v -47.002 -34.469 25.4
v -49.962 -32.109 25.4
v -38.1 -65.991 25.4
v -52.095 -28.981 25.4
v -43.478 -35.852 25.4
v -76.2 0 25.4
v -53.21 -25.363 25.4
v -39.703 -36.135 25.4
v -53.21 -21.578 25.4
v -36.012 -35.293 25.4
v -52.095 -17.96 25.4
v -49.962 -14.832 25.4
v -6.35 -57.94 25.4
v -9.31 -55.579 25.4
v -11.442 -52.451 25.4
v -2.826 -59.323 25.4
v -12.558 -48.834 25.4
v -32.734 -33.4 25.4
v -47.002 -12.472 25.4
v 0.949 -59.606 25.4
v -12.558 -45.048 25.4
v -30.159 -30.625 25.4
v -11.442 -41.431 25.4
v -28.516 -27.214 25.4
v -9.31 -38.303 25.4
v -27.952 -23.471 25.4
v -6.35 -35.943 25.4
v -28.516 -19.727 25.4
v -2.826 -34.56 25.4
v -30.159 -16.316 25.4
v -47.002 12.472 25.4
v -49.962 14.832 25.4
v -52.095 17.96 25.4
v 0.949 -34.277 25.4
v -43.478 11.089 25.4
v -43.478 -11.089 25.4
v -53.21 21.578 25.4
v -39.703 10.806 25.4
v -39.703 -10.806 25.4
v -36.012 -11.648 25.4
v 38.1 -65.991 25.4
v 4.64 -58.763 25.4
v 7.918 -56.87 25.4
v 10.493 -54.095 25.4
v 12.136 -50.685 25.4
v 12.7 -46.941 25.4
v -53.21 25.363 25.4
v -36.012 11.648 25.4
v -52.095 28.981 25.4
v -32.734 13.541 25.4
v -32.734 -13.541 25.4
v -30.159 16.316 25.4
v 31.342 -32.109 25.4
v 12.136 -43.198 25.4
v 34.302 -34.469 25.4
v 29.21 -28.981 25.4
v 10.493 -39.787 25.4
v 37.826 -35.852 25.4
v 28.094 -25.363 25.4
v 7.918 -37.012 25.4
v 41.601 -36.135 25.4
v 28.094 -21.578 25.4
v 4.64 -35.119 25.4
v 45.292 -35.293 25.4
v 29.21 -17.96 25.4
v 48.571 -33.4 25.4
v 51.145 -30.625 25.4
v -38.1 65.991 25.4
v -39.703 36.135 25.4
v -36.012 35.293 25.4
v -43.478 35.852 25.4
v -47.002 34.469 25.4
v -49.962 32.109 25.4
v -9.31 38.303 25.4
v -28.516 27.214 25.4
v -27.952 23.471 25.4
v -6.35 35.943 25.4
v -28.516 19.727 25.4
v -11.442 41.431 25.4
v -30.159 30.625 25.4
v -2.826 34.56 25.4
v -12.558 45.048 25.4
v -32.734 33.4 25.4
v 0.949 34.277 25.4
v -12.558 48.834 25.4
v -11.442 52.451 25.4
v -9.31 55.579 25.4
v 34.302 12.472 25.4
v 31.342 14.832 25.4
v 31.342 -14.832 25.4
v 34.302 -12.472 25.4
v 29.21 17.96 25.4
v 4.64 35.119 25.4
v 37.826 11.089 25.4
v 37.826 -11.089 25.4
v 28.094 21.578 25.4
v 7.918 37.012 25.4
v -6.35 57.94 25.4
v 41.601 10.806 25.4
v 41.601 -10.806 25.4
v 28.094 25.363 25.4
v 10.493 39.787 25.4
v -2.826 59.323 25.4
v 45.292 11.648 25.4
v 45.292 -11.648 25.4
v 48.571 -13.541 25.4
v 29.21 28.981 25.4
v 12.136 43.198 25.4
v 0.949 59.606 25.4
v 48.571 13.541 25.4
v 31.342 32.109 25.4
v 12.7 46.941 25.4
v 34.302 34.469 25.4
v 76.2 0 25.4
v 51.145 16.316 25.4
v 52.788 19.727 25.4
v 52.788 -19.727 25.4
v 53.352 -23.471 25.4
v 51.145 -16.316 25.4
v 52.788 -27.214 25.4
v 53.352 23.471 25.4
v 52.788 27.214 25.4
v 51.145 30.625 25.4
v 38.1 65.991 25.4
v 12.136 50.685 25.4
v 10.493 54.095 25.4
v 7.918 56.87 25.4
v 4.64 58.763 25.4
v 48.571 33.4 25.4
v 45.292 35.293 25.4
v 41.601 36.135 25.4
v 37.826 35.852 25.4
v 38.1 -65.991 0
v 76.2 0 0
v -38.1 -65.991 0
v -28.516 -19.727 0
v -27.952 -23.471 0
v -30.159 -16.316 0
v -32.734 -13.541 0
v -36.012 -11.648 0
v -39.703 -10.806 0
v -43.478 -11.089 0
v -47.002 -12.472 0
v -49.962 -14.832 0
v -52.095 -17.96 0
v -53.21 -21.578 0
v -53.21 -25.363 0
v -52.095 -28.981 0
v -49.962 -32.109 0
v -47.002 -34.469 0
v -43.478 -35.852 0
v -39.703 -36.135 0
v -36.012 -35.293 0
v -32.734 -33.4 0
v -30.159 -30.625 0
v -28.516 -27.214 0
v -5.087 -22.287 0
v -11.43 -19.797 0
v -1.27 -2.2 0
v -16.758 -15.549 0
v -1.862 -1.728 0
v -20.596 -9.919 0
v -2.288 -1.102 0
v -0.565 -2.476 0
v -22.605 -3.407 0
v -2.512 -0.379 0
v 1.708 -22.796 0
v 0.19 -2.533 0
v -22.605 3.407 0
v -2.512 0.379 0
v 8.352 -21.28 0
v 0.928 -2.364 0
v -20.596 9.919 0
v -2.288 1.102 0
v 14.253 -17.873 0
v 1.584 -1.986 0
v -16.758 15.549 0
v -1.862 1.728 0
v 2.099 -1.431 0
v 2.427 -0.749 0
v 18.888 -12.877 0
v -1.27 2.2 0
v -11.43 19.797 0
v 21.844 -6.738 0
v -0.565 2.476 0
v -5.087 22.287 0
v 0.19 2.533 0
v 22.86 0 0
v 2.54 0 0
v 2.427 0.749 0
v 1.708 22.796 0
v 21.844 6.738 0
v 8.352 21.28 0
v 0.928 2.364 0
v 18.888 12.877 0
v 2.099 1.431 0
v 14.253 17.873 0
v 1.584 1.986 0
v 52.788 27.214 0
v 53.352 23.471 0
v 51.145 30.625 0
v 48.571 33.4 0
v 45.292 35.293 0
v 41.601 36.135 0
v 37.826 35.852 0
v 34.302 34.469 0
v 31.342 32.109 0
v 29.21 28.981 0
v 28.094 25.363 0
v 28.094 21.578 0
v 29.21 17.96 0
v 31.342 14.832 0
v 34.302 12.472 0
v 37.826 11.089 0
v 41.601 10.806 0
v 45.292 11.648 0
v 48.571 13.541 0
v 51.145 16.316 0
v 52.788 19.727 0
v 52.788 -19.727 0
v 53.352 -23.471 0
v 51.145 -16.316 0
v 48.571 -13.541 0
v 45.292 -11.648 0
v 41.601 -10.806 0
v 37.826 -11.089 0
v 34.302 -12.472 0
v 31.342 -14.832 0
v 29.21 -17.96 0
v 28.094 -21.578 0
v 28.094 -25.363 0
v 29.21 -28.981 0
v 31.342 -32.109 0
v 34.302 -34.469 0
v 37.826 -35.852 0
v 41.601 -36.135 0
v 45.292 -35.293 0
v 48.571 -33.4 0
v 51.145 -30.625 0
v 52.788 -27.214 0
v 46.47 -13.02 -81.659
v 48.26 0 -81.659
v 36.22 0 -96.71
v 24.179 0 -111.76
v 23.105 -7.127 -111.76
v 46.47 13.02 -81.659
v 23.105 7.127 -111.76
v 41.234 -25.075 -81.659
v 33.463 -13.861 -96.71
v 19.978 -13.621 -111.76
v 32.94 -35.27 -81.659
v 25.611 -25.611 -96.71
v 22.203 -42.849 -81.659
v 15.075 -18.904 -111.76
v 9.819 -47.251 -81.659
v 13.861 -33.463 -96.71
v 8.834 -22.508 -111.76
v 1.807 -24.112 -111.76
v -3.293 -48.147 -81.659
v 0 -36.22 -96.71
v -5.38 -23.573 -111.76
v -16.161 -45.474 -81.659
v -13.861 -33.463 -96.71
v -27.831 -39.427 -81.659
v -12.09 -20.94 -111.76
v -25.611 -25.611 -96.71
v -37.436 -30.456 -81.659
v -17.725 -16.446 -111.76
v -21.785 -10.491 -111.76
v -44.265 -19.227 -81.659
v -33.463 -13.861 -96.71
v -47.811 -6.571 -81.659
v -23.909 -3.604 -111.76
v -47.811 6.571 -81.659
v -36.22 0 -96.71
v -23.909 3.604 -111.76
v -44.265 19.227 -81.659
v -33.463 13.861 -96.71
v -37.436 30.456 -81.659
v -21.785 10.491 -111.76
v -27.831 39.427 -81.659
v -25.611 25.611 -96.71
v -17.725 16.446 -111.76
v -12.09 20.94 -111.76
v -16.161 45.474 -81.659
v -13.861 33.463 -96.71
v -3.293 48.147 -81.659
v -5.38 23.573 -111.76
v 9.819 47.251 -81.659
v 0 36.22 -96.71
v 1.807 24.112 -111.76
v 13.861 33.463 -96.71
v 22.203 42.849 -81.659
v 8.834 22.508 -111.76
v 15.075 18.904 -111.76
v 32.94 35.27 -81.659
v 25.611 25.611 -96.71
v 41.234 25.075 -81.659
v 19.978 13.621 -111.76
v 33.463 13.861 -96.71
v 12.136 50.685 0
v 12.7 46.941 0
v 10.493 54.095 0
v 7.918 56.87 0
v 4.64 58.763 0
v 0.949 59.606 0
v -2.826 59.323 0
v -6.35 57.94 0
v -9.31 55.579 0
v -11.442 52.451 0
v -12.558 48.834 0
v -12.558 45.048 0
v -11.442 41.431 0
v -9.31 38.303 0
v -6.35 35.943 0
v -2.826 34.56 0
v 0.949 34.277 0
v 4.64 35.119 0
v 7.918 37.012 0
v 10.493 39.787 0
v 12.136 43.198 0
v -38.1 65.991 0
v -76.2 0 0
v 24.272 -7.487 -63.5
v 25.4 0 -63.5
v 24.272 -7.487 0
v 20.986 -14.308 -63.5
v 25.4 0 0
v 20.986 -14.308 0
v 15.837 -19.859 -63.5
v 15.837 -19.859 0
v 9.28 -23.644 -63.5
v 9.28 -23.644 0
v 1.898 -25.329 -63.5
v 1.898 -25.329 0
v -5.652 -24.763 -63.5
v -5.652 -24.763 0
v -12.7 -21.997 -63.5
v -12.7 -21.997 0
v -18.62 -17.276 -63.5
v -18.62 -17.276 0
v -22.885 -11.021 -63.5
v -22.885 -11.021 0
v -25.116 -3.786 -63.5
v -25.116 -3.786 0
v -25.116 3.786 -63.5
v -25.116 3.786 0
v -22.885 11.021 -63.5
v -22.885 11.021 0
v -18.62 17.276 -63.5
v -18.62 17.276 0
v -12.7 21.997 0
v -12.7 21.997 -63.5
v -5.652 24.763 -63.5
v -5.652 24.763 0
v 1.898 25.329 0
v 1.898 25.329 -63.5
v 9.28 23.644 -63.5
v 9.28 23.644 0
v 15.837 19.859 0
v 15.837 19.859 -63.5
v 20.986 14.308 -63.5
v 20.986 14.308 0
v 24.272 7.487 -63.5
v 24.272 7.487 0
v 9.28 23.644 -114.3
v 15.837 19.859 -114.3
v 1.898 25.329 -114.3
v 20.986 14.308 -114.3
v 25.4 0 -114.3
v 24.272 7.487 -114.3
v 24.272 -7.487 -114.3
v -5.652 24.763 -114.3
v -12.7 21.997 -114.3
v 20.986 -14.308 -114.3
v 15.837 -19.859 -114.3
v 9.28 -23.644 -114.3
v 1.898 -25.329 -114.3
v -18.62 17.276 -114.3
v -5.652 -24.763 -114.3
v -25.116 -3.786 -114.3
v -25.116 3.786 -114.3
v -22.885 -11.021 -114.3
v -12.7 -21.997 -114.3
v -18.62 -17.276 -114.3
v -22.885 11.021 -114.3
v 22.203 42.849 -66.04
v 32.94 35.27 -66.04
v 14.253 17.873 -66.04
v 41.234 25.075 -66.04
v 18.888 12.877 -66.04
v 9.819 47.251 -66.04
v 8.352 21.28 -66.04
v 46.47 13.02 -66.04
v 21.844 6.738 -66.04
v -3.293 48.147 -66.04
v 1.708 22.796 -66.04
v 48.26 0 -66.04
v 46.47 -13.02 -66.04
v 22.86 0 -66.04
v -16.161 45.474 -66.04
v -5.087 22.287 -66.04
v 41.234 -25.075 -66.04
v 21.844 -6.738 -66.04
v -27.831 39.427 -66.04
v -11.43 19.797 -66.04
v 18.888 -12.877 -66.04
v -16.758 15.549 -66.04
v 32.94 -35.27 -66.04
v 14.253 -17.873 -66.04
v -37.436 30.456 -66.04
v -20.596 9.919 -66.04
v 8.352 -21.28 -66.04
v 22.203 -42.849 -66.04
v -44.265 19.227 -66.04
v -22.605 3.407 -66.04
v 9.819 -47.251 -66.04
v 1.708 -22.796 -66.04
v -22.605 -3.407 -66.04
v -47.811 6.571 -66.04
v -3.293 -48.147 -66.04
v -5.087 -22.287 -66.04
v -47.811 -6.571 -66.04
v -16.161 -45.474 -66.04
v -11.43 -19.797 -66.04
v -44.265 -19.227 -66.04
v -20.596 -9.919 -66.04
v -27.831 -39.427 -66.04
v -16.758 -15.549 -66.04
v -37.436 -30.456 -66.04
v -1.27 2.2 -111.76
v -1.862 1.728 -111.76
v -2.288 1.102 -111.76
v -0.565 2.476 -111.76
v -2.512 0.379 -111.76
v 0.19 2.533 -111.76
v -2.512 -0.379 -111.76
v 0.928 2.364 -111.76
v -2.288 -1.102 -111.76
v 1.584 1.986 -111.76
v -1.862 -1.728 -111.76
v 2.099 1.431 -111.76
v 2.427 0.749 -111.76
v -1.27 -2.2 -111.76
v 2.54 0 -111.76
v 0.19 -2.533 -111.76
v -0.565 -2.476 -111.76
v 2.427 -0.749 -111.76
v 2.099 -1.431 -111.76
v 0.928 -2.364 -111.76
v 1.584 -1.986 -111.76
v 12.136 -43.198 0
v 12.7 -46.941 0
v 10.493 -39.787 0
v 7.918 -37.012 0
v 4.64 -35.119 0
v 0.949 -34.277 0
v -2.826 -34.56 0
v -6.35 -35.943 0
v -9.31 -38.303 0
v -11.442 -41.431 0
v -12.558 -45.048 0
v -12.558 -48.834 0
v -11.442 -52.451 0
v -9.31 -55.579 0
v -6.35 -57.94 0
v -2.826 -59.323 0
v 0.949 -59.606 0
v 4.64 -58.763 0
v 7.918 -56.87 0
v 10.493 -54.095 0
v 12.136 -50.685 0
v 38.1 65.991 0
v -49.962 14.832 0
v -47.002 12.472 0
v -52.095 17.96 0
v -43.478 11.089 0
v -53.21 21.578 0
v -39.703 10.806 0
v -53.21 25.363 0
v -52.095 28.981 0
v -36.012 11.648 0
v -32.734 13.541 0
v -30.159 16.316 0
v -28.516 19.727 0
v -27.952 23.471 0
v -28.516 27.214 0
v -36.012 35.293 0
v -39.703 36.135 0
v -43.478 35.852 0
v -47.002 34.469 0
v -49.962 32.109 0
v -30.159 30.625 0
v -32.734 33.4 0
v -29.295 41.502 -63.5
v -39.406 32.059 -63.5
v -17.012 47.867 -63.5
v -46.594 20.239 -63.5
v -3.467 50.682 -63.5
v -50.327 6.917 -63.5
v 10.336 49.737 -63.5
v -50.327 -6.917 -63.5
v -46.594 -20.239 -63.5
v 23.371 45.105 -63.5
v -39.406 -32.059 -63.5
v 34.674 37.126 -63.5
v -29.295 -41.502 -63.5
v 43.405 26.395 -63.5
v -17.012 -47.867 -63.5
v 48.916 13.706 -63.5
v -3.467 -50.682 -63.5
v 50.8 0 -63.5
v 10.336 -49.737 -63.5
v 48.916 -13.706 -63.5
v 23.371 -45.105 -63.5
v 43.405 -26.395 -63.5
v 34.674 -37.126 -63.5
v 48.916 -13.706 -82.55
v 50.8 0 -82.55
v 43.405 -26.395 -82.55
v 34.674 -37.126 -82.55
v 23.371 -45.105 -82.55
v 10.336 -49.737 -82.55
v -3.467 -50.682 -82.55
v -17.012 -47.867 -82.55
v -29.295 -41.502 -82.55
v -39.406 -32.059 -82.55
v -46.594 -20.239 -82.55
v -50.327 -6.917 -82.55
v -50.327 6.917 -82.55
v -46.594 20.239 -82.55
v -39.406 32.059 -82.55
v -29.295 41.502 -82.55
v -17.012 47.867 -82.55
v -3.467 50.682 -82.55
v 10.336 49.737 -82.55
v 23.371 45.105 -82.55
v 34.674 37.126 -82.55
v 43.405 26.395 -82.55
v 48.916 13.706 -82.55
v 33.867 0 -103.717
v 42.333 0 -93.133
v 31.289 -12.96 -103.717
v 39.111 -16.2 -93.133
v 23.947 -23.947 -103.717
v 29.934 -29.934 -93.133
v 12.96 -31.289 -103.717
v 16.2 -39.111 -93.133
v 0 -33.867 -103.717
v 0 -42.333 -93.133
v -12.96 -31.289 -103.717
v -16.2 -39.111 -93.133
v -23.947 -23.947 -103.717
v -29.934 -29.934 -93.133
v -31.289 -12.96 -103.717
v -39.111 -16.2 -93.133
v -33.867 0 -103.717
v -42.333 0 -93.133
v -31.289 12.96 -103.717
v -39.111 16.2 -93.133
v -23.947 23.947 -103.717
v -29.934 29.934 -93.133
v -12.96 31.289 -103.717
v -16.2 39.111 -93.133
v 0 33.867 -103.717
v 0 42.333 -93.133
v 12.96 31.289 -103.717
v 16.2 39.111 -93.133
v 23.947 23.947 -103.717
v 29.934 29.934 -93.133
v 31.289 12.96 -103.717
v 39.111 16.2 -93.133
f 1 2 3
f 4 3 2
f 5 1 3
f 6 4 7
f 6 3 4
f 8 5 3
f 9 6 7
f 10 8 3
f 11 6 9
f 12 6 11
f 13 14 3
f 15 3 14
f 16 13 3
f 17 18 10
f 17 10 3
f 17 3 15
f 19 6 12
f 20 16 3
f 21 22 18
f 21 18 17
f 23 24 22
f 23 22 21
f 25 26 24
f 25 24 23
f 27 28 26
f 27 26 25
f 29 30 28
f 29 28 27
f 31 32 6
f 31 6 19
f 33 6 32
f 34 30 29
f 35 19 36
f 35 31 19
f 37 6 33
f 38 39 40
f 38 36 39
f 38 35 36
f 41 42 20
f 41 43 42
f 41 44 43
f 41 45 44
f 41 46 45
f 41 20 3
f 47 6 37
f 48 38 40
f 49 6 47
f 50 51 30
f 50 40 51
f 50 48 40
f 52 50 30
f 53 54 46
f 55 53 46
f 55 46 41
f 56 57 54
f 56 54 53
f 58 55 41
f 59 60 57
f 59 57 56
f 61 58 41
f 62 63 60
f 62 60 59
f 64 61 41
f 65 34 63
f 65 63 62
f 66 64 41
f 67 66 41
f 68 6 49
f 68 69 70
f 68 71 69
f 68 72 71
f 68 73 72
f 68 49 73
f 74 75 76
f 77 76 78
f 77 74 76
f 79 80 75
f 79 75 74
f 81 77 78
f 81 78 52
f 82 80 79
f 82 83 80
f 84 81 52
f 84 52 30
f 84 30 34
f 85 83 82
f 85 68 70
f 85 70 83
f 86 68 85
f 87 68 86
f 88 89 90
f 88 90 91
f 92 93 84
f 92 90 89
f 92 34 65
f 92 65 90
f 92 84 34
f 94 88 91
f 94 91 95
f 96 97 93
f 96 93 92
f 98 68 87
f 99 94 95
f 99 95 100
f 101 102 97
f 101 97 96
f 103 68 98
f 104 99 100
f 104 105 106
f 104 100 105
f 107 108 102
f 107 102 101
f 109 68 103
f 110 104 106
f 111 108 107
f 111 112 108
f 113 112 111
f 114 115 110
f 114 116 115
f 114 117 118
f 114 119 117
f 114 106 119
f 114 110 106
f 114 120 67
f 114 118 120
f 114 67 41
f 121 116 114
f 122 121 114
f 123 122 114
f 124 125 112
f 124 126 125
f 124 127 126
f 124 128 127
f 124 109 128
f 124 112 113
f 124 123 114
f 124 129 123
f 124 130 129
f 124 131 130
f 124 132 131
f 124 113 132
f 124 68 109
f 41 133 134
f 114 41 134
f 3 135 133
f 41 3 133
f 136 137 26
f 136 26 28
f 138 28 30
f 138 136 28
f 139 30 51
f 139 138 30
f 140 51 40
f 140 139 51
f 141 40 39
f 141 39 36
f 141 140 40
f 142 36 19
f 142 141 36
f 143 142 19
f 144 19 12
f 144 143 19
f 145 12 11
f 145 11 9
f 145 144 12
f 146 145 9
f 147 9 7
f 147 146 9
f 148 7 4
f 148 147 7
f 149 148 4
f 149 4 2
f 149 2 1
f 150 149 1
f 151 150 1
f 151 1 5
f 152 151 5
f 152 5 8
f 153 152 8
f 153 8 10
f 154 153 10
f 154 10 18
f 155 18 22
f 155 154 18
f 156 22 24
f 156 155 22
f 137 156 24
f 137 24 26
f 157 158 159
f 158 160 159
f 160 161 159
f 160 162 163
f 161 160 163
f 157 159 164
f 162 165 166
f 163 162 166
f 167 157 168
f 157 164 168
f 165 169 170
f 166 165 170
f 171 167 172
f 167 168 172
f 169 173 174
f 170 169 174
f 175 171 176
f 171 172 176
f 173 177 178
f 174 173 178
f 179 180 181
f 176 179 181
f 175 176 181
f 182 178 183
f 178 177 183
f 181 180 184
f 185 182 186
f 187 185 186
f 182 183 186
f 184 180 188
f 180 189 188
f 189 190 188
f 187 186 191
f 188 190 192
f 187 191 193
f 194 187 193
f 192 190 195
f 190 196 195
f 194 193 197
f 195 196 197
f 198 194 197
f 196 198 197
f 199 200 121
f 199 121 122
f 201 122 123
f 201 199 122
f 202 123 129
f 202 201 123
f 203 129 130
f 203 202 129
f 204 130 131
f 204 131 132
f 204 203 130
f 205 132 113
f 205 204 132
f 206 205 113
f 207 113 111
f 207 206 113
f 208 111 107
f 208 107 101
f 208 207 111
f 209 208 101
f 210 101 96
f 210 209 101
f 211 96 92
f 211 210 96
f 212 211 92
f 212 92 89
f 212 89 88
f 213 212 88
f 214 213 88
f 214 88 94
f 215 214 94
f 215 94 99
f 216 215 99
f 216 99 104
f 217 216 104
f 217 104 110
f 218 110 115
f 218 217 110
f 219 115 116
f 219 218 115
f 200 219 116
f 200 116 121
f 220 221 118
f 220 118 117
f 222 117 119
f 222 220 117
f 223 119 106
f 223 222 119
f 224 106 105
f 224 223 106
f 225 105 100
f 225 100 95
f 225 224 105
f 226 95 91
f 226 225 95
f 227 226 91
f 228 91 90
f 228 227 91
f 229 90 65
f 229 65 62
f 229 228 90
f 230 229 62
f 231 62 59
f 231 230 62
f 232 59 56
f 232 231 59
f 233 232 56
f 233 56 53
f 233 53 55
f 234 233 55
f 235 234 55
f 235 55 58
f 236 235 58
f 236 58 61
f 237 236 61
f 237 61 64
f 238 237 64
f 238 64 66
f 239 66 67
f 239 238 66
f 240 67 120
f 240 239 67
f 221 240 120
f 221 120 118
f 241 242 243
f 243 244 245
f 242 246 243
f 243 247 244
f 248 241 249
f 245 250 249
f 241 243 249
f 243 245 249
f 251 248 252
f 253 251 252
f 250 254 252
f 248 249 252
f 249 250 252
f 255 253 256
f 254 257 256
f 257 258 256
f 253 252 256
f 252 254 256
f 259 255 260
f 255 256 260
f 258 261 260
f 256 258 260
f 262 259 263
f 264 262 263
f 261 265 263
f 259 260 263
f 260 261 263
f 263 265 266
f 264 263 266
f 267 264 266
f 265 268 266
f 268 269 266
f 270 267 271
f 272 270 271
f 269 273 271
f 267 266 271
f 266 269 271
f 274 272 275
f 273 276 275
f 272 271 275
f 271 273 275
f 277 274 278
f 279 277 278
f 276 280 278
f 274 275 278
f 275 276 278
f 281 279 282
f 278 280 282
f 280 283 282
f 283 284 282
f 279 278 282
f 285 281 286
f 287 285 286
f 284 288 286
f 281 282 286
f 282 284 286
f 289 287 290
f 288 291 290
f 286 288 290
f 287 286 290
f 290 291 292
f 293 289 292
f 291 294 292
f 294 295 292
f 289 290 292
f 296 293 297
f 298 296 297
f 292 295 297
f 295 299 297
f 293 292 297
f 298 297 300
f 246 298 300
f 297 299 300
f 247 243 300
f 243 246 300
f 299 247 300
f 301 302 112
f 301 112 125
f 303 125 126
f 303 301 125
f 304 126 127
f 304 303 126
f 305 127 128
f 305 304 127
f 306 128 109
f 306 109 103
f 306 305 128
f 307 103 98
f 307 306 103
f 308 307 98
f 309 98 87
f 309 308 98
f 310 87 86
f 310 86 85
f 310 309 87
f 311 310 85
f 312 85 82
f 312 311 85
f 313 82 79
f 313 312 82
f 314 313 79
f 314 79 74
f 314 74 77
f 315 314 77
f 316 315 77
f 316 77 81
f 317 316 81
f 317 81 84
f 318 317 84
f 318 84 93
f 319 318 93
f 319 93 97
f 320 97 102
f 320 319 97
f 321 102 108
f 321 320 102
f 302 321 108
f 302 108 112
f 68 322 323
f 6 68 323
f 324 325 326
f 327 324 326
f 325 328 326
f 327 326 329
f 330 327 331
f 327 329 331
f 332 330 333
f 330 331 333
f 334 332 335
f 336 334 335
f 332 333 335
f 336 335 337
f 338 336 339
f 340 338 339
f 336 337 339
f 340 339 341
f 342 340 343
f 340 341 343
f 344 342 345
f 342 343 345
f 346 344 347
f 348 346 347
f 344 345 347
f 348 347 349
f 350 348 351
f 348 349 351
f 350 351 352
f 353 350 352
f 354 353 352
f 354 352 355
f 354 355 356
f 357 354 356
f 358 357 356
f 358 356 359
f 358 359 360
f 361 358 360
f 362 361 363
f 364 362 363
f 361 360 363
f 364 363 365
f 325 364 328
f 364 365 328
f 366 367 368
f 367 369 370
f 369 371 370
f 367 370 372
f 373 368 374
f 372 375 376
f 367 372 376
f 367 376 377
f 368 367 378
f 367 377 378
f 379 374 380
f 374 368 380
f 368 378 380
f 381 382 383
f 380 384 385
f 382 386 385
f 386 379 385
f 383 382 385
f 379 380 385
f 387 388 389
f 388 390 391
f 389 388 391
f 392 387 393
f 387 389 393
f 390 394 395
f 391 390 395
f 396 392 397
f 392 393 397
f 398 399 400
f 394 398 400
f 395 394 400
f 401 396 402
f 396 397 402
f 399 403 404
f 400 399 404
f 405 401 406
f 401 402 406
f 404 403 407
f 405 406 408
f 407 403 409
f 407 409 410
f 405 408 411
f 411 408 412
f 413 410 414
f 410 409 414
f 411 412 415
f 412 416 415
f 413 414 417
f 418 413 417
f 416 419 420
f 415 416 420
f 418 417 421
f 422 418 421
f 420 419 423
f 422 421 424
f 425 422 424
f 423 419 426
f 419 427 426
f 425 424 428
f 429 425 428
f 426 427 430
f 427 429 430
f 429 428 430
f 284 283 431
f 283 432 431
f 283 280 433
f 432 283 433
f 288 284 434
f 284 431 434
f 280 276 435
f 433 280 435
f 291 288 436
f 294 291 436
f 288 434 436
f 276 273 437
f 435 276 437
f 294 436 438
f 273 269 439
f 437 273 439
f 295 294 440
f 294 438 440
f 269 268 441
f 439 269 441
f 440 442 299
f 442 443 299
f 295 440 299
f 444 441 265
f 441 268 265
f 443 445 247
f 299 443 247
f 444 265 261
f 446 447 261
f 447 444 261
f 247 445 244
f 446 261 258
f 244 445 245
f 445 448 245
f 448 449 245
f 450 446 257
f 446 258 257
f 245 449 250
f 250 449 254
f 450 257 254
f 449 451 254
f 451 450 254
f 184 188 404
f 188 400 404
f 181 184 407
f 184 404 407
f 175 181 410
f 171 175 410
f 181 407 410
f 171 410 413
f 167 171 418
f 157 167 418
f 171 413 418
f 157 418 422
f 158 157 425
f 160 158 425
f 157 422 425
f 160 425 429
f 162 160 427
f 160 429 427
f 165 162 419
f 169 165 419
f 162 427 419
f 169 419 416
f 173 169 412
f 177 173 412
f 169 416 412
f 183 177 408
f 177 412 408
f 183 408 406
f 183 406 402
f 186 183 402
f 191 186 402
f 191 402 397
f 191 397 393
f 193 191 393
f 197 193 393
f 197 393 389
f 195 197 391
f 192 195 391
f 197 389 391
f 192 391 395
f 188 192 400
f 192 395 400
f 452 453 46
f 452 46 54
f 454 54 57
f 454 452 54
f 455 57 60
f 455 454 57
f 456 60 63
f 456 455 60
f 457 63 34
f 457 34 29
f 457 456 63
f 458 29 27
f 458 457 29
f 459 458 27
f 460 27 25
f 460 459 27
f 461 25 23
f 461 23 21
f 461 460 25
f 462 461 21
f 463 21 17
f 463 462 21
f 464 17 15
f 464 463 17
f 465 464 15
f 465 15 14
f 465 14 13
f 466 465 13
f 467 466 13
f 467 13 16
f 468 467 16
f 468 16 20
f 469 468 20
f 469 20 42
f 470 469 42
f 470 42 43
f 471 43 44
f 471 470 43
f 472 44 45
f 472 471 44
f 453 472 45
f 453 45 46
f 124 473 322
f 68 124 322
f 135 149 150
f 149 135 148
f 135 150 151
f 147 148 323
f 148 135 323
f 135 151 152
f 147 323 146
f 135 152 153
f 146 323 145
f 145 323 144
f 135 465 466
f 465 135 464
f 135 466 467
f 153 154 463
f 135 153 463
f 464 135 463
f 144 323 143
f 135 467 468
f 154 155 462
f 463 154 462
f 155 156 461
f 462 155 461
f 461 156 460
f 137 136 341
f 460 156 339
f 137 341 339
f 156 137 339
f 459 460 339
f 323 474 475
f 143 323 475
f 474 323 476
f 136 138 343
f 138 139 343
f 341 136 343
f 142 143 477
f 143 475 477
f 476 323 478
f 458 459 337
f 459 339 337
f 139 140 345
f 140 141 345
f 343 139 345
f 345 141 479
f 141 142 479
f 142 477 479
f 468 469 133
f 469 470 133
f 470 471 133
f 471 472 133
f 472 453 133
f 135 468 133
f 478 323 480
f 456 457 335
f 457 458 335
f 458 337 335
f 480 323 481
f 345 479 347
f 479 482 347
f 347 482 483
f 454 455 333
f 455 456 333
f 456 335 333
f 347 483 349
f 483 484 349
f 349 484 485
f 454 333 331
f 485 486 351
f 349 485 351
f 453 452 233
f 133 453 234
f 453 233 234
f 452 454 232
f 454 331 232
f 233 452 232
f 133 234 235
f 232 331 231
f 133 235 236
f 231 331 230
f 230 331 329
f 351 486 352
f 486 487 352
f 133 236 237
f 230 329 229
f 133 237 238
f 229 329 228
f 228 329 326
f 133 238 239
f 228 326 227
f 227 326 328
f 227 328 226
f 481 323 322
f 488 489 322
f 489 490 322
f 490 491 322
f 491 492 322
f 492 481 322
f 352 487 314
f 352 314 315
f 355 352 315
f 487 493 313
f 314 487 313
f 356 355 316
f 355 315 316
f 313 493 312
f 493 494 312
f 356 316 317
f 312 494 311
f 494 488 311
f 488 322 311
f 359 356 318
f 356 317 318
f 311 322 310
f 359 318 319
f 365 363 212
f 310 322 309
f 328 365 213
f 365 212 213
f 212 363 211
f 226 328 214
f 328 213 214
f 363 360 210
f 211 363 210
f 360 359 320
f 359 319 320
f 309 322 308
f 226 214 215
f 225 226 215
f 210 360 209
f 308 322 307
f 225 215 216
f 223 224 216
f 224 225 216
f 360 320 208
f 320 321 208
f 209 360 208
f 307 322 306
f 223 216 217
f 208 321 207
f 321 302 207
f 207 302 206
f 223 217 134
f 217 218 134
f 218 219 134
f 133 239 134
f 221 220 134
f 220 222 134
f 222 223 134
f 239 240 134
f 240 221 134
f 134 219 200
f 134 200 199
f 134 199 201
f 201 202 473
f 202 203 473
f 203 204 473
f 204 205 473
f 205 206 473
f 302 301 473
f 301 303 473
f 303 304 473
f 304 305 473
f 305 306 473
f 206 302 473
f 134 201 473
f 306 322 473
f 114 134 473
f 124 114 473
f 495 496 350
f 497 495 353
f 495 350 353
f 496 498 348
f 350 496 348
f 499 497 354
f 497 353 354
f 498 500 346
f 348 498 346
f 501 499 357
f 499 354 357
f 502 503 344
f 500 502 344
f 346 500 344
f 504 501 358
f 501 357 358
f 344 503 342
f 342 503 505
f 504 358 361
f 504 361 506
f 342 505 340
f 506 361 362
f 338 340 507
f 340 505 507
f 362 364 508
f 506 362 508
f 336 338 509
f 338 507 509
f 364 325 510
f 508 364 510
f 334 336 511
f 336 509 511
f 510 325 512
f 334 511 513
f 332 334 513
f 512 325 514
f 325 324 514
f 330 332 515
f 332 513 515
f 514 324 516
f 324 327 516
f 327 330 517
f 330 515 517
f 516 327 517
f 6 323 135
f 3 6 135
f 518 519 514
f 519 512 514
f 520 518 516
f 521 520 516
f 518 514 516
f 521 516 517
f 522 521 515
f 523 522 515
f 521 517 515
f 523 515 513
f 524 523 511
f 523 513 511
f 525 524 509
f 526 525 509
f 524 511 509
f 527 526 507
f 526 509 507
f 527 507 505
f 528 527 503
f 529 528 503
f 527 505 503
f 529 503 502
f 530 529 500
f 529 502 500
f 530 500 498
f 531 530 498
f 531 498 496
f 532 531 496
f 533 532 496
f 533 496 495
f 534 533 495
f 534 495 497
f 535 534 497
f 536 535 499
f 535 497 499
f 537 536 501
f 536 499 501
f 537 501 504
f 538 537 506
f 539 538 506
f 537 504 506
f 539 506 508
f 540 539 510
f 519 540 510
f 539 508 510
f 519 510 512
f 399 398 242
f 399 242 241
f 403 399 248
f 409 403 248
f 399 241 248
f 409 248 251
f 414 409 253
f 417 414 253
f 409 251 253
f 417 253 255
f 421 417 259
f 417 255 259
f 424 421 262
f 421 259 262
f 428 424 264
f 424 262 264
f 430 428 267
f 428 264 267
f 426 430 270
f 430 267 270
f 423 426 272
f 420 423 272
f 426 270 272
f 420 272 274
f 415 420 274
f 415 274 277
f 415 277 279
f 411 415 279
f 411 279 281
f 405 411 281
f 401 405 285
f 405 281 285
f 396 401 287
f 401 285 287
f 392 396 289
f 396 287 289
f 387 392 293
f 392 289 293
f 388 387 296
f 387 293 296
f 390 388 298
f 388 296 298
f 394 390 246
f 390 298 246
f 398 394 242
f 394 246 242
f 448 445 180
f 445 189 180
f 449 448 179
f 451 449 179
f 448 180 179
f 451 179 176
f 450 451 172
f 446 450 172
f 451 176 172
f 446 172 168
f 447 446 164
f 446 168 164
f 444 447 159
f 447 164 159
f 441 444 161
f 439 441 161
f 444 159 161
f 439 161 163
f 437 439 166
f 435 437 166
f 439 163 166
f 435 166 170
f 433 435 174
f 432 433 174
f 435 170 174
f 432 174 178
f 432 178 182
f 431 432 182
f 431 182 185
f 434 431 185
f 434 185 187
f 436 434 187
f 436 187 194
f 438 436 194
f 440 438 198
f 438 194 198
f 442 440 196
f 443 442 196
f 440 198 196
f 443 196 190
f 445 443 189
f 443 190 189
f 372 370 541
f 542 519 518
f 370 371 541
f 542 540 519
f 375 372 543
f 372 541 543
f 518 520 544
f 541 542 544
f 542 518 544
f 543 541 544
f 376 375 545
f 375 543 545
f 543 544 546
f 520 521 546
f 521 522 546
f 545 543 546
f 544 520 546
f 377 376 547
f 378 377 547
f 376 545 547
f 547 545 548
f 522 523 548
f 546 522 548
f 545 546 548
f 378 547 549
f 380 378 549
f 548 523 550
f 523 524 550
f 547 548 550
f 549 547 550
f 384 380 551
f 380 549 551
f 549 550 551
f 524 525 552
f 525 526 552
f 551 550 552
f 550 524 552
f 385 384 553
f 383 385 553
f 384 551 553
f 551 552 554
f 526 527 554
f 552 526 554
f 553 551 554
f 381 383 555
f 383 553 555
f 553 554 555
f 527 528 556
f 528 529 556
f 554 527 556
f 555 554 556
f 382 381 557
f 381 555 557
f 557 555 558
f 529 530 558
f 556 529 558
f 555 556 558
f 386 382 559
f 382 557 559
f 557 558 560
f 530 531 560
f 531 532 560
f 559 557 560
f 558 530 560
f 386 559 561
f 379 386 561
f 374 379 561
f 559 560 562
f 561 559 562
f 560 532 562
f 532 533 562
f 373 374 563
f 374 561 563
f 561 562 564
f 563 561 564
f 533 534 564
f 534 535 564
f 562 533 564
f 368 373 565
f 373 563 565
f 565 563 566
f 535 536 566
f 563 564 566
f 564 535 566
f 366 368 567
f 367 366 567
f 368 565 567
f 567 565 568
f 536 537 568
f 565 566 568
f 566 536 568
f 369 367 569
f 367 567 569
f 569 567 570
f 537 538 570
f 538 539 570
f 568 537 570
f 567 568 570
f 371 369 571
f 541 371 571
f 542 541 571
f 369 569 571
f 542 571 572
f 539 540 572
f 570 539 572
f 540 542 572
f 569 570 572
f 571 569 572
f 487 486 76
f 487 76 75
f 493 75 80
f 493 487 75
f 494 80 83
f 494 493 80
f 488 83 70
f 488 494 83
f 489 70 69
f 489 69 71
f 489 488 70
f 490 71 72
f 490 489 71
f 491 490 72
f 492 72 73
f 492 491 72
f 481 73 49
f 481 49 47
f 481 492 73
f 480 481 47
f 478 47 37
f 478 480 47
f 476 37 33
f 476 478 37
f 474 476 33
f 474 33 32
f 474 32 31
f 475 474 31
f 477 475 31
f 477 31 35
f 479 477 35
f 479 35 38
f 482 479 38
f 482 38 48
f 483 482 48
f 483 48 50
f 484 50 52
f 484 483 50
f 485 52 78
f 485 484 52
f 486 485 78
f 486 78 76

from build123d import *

# Parameters (mm, degrees)
SKETCH1_R           = 12.7
BOSS_EXTRUDE3_DEPTH = 25.4


with BuildPart() as part:
    # Sketch1 → Boss-Extrude3 (new body)
    with BuildSketch(Plane.XY):
        Polygon((-76.2, 0), (-38.1, -65.991135768), (38.1, -65.991135768), (76.2, 0), (38.1, 65.991135768), (-38.1, 65.991135768), align=None)
        with Locations((0, -46.941135768)):
            Circle(SKETCH1_R, mode=Mode.SUBTRACT)
        with Locations((-40.652216058, -23.470567884)):
            Circle(SKETCH1_R, mode=Mode.SUBTRACT)
        with Locations((-40.652216058, 23.470567884)):
            Circle(SKETCH1_R, mode=Mode.SUBTRACT)
        with Locations((0, 46.941135768)):
            Circle(SKETCH1_R, mode=Mode.SUBTRACT)
        with Locations((40.652216058, 23.470567884)):
            Circle(SKETCH1_R, mode=Mode.SUBTRACT)
        with Locations((40.652216058, -23.470567884)):
            Circle(SKETCH1_R, mode=Mode.SUBTRACT)
    extrude(amount=BOSS_EXTRUDE3_DEPTH)

    # Sketch2 → Revolve-Thin1 (revolve)
    with BuildSketch(Plane(origin=(0, 0, 0), x_dir=(1, 0, 0), z_dir=(0, 1, 0))):
        Polygon((0, 0), (0, 114.3), (25.4, 114.3), (50.8, 82.55), (50.8, 63.5), (25.4, 63.5), (25.4, 0), (22.86, 0), (22.86, 66.04), (48.26, 66.04), (48.26, 81.659016109), (24.179212887, 111.76), (2.54, 111.76), (2.54, 0), align=None)
    revolve(axis=Axis((0, 0, -33.186581784), (0, 0, -1)))


solid = part.part
